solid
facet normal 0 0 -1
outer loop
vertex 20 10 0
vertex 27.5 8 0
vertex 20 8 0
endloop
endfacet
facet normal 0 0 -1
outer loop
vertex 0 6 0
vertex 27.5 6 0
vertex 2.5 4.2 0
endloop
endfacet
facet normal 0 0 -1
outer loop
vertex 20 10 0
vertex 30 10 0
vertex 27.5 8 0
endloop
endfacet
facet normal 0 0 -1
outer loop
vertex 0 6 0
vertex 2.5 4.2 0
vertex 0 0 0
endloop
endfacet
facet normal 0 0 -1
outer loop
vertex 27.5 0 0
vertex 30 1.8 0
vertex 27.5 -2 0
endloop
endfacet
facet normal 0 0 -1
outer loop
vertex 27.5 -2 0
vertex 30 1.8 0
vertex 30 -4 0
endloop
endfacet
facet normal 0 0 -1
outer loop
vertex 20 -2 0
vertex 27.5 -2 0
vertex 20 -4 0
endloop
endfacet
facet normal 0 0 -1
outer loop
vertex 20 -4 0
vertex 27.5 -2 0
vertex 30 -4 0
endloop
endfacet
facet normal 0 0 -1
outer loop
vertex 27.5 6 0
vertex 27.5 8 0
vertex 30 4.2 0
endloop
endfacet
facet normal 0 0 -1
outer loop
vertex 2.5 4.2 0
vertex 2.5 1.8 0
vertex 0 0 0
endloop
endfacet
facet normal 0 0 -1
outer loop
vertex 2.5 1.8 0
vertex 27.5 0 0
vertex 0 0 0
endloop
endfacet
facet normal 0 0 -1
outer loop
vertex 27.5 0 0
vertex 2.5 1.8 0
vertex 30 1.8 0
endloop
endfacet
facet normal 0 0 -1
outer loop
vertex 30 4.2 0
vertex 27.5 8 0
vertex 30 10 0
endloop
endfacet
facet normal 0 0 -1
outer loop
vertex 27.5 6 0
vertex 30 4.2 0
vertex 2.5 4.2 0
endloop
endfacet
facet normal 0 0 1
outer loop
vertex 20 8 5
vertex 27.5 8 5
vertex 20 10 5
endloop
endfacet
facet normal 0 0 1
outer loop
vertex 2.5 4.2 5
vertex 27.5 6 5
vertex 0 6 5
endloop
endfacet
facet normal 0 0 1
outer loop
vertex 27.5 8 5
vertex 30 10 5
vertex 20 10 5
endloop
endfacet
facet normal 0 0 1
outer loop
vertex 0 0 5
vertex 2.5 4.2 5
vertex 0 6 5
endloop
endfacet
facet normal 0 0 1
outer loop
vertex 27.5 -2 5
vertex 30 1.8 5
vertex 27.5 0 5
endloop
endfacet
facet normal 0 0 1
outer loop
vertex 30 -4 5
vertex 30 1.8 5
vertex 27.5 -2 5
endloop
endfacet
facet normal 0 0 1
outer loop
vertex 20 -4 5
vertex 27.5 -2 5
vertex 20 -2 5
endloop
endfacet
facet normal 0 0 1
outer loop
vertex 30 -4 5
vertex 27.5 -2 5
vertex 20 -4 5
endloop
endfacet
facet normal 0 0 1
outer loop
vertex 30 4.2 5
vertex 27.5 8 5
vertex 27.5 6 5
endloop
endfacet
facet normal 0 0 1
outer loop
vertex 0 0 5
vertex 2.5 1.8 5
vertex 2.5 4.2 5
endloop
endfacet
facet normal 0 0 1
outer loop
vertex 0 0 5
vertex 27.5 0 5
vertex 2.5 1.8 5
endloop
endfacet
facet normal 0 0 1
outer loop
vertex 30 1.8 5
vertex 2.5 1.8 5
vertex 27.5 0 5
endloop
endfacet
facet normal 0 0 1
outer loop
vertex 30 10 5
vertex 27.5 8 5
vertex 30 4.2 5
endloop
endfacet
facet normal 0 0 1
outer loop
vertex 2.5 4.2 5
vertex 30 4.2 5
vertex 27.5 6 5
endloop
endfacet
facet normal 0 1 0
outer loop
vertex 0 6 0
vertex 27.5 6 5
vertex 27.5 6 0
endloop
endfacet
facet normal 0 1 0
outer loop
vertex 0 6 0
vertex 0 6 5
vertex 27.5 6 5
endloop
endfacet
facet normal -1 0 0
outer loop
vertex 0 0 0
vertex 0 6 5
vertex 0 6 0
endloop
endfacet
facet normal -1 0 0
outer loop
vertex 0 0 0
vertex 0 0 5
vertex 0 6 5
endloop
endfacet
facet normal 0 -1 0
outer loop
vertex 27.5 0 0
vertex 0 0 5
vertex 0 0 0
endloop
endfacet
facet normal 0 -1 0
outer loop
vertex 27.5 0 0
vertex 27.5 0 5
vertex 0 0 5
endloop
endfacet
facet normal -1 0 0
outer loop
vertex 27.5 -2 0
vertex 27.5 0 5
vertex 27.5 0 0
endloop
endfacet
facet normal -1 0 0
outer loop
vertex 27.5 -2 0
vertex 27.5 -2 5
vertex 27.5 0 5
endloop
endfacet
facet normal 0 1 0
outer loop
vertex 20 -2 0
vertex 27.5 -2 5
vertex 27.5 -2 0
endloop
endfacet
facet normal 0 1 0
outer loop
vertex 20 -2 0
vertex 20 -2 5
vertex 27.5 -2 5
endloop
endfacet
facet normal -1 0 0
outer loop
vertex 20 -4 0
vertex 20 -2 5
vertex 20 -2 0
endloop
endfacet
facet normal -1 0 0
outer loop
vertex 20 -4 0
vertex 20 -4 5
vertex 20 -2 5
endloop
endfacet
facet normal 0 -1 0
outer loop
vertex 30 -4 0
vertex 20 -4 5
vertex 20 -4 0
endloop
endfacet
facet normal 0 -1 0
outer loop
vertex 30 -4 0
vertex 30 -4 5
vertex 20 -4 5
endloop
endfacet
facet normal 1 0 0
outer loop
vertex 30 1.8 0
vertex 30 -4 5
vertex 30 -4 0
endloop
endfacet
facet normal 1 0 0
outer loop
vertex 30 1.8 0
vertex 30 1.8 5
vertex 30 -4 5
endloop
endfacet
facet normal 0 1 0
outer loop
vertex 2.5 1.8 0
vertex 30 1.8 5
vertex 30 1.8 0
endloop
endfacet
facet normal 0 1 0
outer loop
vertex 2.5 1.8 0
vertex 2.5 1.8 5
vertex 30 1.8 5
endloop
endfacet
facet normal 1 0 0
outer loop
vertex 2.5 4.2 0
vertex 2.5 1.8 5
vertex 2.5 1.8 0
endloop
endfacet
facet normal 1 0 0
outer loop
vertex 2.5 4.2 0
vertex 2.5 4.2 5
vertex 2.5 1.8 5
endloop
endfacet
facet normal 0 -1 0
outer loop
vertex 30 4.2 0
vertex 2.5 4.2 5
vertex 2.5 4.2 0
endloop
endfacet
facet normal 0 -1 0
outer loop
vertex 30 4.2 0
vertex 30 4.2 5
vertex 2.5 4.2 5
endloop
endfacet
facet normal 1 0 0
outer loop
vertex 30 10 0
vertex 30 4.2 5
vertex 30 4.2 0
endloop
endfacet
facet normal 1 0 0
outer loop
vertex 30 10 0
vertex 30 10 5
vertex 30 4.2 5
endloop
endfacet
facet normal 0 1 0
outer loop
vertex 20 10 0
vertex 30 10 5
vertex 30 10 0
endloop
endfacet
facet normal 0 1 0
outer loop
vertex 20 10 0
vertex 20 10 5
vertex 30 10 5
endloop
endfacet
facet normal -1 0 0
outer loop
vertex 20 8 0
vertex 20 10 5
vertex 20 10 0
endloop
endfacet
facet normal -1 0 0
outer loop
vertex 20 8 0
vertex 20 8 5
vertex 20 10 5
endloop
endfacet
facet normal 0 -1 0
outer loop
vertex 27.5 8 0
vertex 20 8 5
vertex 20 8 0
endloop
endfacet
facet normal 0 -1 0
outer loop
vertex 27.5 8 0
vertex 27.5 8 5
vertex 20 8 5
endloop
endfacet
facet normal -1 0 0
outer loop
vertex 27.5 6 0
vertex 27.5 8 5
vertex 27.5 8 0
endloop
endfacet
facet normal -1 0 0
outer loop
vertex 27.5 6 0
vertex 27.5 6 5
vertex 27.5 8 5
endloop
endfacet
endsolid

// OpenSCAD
length = 30;
width = 6;

module hook(length, width) {
  slitWidth = 0.4 * width;
  difference() {
    square([length, width]);
    translate([2.5, (width / 2) - (slitWidth / 2), 0]) square([length, slitWidth]);
  }
  hookArmLength = 5;
  hookArmWidth = 2;
  color("orange") translate([length - hookArmLength/2, -hookArmWidth, 0]) square([hookArmLength/2, hookArmWidth]);
  color("blue") translate([length - 2 * hookArmLength, -2 * hookArmWidth, 0]) square([2 * hookArmLength, hookArmWidth]);
  color("orange") translate([length - hookArmLength/2, width, 0]) square([hookArmLength/2, hookArmWidth]);
  color("blue") translate([length - 2 *hookArmLength, width+hookArmWidth, 0]) square([2*hookArmLength, hookArmWidth]);
}

linear_extrude(5) hook(length, width);
